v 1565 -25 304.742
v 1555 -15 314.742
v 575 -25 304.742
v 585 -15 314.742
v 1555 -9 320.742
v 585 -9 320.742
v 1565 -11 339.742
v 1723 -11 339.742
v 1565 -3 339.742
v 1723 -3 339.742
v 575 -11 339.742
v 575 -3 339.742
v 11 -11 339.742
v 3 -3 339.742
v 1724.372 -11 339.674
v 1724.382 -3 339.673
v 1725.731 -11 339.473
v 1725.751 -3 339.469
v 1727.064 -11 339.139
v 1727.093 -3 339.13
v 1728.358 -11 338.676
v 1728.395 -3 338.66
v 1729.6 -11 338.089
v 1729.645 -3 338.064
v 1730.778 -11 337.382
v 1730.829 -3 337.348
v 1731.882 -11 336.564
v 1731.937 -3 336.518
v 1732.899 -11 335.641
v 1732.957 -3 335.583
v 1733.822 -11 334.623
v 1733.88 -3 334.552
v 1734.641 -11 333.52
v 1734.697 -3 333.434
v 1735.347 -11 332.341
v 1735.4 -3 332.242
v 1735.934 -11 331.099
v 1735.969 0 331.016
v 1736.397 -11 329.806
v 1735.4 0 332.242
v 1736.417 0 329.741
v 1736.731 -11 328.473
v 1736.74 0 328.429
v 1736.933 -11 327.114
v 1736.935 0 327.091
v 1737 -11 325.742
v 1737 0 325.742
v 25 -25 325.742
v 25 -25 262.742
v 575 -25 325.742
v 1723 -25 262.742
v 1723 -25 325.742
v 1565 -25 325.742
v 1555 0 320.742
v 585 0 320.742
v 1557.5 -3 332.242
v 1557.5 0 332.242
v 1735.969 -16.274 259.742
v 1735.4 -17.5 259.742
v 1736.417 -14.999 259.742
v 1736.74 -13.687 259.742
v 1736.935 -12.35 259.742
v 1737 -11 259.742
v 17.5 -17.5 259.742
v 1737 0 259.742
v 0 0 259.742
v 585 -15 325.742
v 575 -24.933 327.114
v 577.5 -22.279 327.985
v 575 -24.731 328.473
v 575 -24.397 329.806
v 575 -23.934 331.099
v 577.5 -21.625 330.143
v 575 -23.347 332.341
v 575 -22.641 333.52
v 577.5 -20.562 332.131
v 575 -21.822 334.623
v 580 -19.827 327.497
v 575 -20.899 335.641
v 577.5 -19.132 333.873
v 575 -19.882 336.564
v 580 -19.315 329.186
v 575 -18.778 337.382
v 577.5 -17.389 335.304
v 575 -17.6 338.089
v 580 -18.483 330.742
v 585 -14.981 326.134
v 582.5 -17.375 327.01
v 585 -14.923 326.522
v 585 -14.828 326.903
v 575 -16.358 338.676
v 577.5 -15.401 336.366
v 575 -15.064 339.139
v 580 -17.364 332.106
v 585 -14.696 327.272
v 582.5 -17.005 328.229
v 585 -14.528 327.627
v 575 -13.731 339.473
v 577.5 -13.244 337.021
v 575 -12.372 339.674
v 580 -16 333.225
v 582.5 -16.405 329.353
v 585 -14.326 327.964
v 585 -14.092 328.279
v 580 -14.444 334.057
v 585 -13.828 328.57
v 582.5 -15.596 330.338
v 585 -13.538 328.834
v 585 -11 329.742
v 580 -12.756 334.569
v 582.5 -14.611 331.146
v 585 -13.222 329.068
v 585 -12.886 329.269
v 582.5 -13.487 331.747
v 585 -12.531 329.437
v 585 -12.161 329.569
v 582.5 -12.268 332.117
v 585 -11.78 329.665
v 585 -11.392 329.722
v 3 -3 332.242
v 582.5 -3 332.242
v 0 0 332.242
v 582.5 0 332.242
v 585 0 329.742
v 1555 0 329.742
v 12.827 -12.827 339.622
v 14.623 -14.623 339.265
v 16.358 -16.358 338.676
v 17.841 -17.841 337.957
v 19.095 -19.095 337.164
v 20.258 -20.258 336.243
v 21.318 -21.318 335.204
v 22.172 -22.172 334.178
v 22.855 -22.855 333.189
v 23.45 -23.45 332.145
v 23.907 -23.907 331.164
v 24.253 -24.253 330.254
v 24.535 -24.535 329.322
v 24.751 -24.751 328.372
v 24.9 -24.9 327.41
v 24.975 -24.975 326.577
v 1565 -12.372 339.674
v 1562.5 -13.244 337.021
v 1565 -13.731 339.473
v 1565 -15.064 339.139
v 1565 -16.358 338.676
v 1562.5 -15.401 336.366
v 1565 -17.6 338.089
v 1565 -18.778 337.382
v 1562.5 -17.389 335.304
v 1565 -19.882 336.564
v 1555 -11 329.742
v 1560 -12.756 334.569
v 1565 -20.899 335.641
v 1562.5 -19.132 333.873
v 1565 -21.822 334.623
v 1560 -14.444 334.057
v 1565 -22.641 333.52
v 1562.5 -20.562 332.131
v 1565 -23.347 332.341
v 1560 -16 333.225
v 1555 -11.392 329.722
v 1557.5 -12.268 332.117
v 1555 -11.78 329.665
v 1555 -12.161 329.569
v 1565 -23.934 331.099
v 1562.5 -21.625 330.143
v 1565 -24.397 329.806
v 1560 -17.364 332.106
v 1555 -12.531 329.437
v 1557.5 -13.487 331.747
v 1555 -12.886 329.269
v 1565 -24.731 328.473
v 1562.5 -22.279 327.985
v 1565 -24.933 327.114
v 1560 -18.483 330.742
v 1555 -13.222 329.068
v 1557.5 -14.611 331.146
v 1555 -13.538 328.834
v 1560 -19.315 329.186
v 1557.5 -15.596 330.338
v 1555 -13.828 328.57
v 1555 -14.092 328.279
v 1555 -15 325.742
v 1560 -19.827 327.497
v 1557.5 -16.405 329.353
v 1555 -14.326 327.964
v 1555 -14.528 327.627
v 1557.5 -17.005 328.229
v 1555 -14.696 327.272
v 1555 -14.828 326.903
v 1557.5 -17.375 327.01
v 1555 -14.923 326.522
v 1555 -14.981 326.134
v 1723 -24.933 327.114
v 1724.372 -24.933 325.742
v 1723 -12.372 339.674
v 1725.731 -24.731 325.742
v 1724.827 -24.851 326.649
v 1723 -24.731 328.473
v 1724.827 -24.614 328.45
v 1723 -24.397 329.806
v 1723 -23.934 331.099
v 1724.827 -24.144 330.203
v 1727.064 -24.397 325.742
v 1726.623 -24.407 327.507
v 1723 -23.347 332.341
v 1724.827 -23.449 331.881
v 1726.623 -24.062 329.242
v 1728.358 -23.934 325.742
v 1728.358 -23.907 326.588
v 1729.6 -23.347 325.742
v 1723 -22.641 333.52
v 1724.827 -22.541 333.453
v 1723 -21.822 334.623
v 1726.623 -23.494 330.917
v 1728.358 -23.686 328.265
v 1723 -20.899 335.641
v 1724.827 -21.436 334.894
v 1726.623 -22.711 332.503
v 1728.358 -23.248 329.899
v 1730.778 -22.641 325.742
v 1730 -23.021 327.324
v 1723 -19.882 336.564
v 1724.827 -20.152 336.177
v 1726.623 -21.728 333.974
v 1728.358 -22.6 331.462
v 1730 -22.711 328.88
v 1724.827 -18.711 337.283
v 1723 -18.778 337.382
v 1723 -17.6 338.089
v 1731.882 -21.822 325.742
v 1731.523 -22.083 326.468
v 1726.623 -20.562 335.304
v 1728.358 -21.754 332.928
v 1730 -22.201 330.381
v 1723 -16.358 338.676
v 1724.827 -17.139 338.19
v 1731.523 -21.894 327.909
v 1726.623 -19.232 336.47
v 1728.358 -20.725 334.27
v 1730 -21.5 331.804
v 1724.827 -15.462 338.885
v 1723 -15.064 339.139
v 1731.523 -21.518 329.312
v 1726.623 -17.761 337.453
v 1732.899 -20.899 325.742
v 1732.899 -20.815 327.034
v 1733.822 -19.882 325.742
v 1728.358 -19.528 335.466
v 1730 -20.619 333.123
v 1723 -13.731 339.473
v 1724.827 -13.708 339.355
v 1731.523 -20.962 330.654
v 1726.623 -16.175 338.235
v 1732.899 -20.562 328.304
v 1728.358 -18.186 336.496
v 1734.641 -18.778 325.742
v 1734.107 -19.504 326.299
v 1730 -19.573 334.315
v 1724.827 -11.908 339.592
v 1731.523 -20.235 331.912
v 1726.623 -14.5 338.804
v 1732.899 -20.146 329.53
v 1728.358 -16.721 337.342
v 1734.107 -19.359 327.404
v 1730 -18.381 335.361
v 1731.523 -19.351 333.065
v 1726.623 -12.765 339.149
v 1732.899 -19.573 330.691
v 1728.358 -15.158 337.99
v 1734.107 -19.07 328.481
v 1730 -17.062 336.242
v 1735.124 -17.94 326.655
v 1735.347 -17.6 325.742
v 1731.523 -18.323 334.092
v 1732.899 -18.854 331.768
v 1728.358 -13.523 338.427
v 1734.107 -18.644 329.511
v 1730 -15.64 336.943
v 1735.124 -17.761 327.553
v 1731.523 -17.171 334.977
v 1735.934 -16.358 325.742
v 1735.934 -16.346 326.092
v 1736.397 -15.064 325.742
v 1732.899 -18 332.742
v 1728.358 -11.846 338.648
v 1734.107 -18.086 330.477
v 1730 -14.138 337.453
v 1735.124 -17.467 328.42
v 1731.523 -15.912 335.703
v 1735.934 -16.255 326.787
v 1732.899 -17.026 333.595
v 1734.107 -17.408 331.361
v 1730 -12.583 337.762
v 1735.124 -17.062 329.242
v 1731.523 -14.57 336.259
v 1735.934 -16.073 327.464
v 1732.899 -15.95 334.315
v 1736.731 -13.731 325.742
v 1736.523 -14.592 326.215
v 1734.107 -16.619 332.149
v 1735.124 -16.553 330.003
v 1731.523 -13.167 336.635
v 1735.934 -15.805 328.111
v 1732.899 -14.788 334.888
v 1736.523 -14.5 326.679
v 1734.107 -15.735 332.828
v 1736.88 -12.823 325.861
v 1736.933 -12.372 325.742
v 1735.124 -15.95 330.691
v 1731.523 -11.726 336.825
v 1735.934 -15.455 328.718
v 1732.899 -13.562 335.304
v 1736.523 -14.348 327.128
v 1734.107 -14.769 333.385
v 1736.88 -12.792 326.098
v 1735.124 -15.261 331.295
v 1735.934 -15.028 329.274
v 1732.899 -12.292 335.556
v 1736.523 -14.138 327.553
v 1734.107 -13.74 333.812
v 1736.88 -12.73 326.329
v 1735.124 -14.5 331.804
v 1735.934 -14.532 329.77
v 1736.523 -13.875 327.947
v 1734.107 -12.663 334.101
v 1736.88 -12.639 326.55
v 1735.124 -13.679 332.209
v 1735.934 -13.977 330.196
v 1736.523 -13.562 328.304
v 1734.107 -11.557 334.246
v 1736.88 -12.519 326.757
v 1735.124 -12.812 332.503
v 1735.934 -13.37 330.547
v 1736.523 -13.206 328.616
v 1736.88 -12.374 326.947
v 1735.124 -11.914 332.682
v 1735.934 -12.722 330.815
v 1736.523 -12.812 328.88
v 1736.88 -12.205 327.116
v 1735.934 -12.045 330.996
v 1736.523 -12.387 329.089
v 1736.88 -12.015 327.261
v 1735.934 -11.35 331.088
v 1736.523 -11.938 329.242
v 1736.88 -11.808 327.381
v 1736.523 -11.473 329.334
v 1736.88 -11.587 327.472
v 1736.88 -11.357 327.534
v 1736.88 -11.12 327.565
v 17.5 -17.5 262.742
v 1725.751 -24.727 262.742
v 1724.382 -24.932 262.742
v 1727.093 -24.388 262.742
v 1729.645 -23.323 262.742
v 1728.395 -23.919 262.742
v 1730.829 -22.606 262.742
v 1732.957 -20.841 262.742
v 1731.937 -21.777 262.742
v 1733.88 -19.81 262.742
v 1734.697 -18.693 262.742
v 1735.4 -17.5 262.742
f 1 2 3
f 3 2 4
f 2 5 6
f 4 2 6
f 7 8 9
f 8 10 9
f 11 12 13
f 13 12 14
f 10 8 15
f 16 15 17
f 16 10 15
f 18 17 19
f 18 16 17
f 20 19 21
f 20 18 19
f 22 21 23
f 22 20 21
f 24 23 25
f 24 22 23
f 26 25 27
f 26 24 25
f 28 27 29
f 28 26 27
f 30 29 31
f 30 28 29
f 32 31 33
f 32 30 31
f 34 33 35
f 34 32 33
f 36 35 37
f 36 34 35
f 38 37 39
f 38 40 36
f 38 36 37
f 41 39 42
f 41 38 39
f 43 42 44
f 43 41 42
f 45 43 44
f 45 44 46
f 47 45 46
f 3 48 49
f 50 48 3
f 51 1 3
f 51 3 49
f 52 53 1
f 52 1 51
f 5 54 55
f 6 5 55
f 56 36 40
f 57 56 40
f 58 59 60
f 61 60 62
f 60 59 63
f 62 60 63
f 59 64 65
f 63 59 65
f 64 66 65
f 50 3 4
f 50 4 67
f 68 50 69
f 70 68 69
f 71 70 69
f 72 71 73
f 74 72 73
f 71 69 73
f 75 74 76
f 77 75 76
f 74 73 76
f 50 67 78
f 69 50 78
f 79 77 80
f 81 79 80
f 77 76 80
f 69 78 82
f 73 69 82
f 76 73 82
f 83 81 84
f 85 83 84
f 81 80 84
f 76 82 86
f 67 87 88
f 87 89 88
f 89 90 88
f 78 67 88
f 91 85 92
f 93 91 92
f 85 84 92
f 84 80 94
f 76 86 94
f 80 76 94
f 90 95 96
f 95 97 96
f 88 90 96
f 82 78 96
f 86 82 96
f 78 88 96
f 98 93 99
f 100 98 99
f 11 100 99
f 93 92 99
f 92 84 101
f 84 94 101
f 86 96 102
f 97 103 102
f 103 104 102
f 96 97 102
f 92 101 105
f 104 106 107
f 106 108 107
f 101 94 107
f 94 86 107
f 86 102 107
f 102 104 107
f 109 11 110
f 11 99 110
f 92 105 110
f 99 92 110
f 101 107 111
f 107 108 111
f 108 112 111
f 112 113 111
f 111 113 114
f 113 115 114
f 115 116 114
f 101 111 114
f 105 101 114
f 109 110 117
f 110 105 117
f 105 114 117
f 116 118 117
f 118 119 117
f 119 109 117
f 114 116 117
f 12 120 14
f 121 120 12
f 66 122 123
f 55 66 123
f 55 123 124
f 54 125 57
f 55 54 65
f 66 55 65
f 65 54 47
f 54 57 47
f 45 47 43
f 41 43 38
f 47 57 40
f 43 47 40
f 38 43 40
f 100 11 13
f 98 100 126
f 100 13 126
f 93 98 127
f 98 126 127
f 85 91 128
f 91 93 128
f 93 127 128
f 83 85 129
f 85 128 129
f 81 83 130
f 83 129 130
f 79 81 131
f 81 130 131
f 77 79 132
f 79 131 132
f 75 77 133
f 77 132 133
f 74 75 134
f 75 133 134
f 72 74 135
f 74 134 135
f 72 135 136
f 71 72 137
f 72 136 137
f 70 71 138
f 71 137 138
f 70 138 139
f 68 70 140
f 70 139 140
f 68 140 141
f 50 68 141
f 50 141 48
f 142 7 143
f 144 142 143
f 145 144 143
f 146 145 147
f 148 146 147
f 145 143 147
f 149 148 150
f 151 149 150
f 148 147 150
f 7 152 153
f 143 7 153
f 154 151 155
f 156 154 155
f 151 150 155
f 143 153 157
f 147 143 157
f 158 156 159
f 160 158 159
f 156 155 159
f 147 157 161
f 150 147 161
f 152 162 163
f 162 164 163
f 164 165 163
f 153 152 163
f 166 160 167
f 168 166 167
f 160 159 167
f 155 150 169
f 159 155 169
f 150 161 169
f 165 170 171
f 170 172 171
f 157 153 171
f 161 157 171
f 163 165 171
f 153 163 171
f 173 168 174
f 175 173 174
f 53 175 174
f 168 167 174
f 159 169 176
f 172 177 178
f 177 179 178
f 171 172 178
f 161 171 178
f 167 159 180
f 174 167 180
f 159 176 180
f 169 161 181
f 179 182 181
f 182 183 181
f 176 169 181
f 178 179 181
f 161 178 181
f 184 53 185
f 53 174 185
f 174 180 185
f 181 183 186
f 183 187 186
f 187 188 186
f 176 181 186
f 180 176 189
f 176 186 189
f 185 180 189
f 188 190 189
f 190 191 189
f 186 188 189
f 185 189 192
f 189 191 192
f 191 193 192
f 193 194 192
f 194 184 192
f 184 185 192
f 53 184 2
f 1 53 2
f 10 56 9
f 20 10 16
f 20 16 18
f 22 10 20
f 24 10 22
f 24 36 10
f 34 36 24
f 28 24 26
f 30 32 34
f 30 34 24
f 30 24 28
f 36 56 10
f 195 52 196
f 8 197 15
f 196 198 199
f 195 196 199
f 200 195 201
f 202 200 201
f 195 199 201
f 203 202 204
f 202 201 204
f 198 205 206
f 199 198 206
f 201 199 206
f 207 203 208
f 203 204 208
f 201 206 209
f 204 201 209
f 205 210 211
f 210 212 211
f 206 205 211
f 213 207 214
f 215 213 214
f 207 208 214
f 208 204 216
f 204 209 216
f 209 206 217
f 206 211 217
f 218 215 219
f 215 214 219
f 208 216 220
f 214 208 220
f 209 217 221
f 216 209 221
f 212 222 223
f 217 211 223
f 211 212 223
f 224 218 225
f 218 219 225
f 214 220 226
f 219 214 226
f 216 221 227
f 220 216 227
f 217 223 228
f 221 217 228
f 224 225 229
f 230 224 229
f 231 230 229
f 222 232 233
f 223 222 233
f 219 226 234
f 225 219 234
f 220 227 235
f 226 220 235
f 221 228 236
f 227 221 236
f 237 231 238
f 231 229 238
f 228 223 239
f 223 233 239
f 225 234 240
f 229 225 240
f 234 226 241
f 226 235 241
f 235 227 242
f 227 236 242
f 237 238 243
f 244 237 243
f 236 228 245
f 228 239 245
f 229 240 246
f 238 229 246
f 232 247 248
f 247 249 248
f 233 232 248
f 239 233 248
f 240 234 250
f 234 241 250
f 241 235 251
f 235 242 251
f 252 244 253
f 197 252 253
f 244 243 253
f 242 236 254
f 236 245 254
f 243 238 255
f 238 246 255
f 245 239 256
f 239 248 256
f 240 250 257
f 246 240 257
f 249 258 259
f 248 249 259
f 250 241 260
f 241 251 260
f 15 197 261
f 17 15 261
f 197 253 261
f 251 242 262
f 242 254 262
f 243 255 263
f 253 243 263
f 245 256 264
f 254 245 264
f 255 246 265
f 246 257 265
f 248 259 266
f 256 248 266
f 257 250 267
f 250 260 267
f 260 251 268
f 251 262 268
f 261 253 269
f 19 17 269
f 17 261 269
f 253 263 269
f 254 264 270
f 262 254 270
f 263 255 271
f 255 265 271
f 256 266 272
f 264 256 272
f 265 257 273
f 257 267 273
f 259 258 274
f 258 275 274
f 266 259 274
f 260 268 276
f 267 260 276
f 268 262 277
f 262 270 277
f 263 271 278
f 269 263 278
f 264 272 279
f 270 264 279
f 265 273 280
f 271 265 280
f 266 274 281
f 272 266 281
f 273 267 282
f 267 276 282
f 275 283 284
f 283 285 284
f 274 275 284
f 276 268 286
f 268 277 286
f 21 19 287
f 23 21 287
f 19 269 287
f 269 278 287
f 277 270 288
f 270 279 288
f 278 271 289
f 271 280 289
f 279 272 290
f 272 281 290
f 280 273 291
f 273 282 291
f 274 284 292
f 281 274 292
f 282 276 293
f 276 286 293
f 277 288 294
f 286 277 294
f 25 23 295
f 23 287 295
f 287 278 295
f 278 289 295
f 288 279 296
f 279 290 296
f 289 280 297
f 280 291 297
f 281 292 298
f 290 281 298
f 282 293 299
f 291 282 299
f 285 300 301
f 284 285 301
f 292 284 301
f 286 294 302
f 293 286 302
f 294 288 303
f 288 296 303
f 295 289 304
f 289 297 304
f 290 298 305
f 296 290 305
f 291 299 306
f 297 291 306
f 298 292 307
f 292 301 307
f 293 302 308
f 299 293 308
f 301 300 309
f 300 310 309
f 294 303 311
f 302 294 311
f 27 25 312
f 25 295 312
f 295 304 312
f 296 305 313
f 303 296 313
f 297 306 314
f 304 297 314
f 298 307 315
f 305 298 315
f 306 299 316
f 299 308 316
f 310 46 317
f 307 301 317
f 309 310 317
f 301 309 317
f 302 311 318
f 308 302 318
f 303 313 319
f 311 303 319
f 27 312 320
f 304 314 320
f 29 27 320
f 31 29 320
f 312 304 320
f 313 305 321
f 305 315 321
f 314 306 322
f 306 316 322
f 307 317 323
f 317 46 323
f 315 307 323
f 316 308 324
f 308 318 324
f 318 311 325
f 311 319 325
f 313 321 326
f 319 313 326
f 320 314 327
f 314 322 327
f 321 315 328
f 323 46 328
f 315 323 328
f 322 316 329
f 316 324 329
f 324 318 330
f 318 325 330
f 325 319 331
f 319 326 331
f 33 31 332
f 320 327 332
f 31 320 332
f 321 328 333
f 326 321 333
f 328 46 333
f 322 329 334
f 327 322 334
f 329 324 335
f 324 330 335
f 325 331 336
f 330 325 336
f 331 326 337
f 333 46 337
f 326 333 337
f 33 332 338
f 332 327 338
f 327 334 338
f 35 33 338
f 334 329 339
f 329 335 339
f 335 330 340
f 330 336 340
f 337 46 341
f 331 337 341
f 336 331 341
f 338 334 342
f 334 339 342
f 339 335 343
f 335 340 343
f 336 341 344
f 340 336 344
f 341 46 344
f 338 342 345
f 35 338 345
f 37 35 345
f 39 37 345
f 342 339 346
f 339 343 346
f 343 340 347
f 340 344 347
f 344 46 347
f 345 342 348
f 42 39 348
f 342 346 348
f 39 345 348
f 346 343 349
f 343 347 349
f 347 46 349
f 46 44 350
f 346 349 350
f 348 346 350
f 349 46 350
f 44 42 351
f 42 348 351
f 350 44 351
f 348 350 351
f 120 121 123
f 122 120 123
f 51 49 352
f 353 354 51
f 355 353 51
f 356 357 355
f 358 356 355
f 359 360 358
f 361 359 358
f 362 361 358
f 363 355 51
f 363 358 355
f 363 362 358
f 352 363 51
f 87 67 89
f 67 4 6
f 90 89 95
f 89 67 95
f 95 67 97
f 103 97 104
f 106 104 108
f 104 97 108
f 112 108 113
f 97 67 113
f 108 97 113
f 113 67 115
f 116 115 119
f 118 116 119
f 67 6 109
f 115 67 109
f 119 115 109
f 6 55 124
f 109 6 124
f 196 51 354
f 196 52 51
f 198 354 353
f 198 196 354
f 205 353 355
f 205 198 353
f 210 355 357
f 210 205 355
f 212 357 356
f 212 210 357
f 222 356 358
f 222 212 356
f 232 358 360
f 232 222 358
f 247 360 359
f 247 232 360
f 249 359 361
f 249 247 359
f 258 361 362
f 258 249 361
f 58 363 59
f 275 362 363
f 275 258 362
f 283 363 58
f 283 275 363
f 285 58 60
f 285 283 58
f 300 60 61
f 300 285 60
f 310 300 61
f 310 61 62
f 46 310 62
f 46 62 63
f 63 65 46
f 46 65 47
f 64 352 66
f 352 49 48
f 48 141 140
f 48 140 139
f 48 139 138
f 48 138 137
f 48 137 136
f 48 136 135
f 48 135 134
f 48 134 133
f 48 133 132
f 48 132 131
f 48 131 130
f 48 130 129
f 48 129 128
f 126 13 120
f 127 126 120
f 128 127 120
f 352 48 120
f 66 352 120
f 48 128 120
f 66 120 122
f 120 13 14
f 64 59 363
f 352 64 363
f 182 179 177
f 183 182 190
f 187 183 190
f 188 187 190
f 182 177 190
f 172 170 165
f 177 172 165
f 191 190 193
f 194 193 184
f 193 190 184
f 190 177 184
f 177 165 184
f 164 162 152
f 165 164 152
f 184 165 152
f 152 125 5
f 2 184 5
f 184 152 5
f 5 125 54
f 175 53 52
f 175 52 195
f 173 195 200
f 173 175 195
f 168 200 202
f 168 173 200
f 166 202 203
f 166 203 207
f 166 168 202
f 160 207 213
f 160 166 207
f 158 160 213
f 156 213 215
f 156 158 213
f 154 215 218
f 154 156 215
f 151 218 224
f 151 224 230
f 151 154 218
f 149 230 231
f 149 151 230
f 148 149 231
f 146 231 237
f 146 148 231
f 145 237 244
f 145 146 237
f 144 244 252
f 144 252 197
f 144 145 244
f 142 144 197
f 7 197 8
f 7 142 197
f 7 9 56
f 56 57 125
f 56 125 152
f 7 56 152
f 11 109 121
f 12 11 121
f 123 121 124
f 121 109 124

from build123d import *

# Parameters (mm, degrees)
F1_DEPTH = 25
F2_W     = 16.846502
F2_H     = 10.444245
F2_W_2   = 5.885671
F2_H_2   = 9.758566
F3_DEPTH = 1737.001
F5_DEPTH = 80.001
F6_R     = 14
F7_R     = 14
F8_SIZE  = 16
F9_SIZE  = 10


with BuildPart() as f1:
    # F0 (on Front) → F1 (new body)
    with BuildSketch(Plane.XZ):
        Polygon((0, 339.741668), (0, 259.741668), (1737, 259.741668), (1737, 339.741668), (1555, 339.741668), (1555, 320.741668), (585, 320.741668), (585, 339.741668), align=None)
    extrude(amount=F1_DEPTH)

    # F2 (on face) → F3 (cut, through all)
    with BuildSketch(Plane.YZ.offset(1737)):
        with Locations((-25.923251, 257.519545)):
            Rectangle(F2_W, F2_H)
        with Locations((-0.057165, 337.120951)):
            Rectangle(F2_W_2, F2_H_2)
    extrude(amount=-F3_DEPTH, mode=Mode.SUBTRACT)

    # F4 (on face) → F5 (cut, through all)
    with BuildSketch(Plane.XY.offset(339.741668)):
        Polygon((29.025003, -29.025003), (0, 0), (-6.033434, 0), (-6.033434, -29.025003), align=None)
    extrude(amount=-F5_DEPTH, mode=Mode.SUBTRACT)

    # F6
    f6_edges = [f1.edges().sort_by_distance(p)[0] for p in [
        (305, -25, 339.741668),
        (1646, -25, 339.741668),
    ]]
    fillet(f6_edges, radius=F6_R)

    # F7
    f7_edges = [f1.edges().sort_by_distance(p)[0] for p in [
        (1737, -25, 294.241668),
    ]]
    fillet(f7_edges, radius=F7_R)

    # F8
    f8_edges = [f1.edges().sort_by_distance(p)[0] for p in [
        (1070, -25, 320.741668),
    ]]
    chamfer(f8_edges, length=F8_SIZE)

    # F9
    f9_edges = [f1.edges().sort_by_distance(p)[0] for p in [
        (585, -25, 323.241668),
        (1555, -25, 323.241668),
    ]]
    chamfer(f9_edges, length=F9_SIZE)


solid = f1.part
